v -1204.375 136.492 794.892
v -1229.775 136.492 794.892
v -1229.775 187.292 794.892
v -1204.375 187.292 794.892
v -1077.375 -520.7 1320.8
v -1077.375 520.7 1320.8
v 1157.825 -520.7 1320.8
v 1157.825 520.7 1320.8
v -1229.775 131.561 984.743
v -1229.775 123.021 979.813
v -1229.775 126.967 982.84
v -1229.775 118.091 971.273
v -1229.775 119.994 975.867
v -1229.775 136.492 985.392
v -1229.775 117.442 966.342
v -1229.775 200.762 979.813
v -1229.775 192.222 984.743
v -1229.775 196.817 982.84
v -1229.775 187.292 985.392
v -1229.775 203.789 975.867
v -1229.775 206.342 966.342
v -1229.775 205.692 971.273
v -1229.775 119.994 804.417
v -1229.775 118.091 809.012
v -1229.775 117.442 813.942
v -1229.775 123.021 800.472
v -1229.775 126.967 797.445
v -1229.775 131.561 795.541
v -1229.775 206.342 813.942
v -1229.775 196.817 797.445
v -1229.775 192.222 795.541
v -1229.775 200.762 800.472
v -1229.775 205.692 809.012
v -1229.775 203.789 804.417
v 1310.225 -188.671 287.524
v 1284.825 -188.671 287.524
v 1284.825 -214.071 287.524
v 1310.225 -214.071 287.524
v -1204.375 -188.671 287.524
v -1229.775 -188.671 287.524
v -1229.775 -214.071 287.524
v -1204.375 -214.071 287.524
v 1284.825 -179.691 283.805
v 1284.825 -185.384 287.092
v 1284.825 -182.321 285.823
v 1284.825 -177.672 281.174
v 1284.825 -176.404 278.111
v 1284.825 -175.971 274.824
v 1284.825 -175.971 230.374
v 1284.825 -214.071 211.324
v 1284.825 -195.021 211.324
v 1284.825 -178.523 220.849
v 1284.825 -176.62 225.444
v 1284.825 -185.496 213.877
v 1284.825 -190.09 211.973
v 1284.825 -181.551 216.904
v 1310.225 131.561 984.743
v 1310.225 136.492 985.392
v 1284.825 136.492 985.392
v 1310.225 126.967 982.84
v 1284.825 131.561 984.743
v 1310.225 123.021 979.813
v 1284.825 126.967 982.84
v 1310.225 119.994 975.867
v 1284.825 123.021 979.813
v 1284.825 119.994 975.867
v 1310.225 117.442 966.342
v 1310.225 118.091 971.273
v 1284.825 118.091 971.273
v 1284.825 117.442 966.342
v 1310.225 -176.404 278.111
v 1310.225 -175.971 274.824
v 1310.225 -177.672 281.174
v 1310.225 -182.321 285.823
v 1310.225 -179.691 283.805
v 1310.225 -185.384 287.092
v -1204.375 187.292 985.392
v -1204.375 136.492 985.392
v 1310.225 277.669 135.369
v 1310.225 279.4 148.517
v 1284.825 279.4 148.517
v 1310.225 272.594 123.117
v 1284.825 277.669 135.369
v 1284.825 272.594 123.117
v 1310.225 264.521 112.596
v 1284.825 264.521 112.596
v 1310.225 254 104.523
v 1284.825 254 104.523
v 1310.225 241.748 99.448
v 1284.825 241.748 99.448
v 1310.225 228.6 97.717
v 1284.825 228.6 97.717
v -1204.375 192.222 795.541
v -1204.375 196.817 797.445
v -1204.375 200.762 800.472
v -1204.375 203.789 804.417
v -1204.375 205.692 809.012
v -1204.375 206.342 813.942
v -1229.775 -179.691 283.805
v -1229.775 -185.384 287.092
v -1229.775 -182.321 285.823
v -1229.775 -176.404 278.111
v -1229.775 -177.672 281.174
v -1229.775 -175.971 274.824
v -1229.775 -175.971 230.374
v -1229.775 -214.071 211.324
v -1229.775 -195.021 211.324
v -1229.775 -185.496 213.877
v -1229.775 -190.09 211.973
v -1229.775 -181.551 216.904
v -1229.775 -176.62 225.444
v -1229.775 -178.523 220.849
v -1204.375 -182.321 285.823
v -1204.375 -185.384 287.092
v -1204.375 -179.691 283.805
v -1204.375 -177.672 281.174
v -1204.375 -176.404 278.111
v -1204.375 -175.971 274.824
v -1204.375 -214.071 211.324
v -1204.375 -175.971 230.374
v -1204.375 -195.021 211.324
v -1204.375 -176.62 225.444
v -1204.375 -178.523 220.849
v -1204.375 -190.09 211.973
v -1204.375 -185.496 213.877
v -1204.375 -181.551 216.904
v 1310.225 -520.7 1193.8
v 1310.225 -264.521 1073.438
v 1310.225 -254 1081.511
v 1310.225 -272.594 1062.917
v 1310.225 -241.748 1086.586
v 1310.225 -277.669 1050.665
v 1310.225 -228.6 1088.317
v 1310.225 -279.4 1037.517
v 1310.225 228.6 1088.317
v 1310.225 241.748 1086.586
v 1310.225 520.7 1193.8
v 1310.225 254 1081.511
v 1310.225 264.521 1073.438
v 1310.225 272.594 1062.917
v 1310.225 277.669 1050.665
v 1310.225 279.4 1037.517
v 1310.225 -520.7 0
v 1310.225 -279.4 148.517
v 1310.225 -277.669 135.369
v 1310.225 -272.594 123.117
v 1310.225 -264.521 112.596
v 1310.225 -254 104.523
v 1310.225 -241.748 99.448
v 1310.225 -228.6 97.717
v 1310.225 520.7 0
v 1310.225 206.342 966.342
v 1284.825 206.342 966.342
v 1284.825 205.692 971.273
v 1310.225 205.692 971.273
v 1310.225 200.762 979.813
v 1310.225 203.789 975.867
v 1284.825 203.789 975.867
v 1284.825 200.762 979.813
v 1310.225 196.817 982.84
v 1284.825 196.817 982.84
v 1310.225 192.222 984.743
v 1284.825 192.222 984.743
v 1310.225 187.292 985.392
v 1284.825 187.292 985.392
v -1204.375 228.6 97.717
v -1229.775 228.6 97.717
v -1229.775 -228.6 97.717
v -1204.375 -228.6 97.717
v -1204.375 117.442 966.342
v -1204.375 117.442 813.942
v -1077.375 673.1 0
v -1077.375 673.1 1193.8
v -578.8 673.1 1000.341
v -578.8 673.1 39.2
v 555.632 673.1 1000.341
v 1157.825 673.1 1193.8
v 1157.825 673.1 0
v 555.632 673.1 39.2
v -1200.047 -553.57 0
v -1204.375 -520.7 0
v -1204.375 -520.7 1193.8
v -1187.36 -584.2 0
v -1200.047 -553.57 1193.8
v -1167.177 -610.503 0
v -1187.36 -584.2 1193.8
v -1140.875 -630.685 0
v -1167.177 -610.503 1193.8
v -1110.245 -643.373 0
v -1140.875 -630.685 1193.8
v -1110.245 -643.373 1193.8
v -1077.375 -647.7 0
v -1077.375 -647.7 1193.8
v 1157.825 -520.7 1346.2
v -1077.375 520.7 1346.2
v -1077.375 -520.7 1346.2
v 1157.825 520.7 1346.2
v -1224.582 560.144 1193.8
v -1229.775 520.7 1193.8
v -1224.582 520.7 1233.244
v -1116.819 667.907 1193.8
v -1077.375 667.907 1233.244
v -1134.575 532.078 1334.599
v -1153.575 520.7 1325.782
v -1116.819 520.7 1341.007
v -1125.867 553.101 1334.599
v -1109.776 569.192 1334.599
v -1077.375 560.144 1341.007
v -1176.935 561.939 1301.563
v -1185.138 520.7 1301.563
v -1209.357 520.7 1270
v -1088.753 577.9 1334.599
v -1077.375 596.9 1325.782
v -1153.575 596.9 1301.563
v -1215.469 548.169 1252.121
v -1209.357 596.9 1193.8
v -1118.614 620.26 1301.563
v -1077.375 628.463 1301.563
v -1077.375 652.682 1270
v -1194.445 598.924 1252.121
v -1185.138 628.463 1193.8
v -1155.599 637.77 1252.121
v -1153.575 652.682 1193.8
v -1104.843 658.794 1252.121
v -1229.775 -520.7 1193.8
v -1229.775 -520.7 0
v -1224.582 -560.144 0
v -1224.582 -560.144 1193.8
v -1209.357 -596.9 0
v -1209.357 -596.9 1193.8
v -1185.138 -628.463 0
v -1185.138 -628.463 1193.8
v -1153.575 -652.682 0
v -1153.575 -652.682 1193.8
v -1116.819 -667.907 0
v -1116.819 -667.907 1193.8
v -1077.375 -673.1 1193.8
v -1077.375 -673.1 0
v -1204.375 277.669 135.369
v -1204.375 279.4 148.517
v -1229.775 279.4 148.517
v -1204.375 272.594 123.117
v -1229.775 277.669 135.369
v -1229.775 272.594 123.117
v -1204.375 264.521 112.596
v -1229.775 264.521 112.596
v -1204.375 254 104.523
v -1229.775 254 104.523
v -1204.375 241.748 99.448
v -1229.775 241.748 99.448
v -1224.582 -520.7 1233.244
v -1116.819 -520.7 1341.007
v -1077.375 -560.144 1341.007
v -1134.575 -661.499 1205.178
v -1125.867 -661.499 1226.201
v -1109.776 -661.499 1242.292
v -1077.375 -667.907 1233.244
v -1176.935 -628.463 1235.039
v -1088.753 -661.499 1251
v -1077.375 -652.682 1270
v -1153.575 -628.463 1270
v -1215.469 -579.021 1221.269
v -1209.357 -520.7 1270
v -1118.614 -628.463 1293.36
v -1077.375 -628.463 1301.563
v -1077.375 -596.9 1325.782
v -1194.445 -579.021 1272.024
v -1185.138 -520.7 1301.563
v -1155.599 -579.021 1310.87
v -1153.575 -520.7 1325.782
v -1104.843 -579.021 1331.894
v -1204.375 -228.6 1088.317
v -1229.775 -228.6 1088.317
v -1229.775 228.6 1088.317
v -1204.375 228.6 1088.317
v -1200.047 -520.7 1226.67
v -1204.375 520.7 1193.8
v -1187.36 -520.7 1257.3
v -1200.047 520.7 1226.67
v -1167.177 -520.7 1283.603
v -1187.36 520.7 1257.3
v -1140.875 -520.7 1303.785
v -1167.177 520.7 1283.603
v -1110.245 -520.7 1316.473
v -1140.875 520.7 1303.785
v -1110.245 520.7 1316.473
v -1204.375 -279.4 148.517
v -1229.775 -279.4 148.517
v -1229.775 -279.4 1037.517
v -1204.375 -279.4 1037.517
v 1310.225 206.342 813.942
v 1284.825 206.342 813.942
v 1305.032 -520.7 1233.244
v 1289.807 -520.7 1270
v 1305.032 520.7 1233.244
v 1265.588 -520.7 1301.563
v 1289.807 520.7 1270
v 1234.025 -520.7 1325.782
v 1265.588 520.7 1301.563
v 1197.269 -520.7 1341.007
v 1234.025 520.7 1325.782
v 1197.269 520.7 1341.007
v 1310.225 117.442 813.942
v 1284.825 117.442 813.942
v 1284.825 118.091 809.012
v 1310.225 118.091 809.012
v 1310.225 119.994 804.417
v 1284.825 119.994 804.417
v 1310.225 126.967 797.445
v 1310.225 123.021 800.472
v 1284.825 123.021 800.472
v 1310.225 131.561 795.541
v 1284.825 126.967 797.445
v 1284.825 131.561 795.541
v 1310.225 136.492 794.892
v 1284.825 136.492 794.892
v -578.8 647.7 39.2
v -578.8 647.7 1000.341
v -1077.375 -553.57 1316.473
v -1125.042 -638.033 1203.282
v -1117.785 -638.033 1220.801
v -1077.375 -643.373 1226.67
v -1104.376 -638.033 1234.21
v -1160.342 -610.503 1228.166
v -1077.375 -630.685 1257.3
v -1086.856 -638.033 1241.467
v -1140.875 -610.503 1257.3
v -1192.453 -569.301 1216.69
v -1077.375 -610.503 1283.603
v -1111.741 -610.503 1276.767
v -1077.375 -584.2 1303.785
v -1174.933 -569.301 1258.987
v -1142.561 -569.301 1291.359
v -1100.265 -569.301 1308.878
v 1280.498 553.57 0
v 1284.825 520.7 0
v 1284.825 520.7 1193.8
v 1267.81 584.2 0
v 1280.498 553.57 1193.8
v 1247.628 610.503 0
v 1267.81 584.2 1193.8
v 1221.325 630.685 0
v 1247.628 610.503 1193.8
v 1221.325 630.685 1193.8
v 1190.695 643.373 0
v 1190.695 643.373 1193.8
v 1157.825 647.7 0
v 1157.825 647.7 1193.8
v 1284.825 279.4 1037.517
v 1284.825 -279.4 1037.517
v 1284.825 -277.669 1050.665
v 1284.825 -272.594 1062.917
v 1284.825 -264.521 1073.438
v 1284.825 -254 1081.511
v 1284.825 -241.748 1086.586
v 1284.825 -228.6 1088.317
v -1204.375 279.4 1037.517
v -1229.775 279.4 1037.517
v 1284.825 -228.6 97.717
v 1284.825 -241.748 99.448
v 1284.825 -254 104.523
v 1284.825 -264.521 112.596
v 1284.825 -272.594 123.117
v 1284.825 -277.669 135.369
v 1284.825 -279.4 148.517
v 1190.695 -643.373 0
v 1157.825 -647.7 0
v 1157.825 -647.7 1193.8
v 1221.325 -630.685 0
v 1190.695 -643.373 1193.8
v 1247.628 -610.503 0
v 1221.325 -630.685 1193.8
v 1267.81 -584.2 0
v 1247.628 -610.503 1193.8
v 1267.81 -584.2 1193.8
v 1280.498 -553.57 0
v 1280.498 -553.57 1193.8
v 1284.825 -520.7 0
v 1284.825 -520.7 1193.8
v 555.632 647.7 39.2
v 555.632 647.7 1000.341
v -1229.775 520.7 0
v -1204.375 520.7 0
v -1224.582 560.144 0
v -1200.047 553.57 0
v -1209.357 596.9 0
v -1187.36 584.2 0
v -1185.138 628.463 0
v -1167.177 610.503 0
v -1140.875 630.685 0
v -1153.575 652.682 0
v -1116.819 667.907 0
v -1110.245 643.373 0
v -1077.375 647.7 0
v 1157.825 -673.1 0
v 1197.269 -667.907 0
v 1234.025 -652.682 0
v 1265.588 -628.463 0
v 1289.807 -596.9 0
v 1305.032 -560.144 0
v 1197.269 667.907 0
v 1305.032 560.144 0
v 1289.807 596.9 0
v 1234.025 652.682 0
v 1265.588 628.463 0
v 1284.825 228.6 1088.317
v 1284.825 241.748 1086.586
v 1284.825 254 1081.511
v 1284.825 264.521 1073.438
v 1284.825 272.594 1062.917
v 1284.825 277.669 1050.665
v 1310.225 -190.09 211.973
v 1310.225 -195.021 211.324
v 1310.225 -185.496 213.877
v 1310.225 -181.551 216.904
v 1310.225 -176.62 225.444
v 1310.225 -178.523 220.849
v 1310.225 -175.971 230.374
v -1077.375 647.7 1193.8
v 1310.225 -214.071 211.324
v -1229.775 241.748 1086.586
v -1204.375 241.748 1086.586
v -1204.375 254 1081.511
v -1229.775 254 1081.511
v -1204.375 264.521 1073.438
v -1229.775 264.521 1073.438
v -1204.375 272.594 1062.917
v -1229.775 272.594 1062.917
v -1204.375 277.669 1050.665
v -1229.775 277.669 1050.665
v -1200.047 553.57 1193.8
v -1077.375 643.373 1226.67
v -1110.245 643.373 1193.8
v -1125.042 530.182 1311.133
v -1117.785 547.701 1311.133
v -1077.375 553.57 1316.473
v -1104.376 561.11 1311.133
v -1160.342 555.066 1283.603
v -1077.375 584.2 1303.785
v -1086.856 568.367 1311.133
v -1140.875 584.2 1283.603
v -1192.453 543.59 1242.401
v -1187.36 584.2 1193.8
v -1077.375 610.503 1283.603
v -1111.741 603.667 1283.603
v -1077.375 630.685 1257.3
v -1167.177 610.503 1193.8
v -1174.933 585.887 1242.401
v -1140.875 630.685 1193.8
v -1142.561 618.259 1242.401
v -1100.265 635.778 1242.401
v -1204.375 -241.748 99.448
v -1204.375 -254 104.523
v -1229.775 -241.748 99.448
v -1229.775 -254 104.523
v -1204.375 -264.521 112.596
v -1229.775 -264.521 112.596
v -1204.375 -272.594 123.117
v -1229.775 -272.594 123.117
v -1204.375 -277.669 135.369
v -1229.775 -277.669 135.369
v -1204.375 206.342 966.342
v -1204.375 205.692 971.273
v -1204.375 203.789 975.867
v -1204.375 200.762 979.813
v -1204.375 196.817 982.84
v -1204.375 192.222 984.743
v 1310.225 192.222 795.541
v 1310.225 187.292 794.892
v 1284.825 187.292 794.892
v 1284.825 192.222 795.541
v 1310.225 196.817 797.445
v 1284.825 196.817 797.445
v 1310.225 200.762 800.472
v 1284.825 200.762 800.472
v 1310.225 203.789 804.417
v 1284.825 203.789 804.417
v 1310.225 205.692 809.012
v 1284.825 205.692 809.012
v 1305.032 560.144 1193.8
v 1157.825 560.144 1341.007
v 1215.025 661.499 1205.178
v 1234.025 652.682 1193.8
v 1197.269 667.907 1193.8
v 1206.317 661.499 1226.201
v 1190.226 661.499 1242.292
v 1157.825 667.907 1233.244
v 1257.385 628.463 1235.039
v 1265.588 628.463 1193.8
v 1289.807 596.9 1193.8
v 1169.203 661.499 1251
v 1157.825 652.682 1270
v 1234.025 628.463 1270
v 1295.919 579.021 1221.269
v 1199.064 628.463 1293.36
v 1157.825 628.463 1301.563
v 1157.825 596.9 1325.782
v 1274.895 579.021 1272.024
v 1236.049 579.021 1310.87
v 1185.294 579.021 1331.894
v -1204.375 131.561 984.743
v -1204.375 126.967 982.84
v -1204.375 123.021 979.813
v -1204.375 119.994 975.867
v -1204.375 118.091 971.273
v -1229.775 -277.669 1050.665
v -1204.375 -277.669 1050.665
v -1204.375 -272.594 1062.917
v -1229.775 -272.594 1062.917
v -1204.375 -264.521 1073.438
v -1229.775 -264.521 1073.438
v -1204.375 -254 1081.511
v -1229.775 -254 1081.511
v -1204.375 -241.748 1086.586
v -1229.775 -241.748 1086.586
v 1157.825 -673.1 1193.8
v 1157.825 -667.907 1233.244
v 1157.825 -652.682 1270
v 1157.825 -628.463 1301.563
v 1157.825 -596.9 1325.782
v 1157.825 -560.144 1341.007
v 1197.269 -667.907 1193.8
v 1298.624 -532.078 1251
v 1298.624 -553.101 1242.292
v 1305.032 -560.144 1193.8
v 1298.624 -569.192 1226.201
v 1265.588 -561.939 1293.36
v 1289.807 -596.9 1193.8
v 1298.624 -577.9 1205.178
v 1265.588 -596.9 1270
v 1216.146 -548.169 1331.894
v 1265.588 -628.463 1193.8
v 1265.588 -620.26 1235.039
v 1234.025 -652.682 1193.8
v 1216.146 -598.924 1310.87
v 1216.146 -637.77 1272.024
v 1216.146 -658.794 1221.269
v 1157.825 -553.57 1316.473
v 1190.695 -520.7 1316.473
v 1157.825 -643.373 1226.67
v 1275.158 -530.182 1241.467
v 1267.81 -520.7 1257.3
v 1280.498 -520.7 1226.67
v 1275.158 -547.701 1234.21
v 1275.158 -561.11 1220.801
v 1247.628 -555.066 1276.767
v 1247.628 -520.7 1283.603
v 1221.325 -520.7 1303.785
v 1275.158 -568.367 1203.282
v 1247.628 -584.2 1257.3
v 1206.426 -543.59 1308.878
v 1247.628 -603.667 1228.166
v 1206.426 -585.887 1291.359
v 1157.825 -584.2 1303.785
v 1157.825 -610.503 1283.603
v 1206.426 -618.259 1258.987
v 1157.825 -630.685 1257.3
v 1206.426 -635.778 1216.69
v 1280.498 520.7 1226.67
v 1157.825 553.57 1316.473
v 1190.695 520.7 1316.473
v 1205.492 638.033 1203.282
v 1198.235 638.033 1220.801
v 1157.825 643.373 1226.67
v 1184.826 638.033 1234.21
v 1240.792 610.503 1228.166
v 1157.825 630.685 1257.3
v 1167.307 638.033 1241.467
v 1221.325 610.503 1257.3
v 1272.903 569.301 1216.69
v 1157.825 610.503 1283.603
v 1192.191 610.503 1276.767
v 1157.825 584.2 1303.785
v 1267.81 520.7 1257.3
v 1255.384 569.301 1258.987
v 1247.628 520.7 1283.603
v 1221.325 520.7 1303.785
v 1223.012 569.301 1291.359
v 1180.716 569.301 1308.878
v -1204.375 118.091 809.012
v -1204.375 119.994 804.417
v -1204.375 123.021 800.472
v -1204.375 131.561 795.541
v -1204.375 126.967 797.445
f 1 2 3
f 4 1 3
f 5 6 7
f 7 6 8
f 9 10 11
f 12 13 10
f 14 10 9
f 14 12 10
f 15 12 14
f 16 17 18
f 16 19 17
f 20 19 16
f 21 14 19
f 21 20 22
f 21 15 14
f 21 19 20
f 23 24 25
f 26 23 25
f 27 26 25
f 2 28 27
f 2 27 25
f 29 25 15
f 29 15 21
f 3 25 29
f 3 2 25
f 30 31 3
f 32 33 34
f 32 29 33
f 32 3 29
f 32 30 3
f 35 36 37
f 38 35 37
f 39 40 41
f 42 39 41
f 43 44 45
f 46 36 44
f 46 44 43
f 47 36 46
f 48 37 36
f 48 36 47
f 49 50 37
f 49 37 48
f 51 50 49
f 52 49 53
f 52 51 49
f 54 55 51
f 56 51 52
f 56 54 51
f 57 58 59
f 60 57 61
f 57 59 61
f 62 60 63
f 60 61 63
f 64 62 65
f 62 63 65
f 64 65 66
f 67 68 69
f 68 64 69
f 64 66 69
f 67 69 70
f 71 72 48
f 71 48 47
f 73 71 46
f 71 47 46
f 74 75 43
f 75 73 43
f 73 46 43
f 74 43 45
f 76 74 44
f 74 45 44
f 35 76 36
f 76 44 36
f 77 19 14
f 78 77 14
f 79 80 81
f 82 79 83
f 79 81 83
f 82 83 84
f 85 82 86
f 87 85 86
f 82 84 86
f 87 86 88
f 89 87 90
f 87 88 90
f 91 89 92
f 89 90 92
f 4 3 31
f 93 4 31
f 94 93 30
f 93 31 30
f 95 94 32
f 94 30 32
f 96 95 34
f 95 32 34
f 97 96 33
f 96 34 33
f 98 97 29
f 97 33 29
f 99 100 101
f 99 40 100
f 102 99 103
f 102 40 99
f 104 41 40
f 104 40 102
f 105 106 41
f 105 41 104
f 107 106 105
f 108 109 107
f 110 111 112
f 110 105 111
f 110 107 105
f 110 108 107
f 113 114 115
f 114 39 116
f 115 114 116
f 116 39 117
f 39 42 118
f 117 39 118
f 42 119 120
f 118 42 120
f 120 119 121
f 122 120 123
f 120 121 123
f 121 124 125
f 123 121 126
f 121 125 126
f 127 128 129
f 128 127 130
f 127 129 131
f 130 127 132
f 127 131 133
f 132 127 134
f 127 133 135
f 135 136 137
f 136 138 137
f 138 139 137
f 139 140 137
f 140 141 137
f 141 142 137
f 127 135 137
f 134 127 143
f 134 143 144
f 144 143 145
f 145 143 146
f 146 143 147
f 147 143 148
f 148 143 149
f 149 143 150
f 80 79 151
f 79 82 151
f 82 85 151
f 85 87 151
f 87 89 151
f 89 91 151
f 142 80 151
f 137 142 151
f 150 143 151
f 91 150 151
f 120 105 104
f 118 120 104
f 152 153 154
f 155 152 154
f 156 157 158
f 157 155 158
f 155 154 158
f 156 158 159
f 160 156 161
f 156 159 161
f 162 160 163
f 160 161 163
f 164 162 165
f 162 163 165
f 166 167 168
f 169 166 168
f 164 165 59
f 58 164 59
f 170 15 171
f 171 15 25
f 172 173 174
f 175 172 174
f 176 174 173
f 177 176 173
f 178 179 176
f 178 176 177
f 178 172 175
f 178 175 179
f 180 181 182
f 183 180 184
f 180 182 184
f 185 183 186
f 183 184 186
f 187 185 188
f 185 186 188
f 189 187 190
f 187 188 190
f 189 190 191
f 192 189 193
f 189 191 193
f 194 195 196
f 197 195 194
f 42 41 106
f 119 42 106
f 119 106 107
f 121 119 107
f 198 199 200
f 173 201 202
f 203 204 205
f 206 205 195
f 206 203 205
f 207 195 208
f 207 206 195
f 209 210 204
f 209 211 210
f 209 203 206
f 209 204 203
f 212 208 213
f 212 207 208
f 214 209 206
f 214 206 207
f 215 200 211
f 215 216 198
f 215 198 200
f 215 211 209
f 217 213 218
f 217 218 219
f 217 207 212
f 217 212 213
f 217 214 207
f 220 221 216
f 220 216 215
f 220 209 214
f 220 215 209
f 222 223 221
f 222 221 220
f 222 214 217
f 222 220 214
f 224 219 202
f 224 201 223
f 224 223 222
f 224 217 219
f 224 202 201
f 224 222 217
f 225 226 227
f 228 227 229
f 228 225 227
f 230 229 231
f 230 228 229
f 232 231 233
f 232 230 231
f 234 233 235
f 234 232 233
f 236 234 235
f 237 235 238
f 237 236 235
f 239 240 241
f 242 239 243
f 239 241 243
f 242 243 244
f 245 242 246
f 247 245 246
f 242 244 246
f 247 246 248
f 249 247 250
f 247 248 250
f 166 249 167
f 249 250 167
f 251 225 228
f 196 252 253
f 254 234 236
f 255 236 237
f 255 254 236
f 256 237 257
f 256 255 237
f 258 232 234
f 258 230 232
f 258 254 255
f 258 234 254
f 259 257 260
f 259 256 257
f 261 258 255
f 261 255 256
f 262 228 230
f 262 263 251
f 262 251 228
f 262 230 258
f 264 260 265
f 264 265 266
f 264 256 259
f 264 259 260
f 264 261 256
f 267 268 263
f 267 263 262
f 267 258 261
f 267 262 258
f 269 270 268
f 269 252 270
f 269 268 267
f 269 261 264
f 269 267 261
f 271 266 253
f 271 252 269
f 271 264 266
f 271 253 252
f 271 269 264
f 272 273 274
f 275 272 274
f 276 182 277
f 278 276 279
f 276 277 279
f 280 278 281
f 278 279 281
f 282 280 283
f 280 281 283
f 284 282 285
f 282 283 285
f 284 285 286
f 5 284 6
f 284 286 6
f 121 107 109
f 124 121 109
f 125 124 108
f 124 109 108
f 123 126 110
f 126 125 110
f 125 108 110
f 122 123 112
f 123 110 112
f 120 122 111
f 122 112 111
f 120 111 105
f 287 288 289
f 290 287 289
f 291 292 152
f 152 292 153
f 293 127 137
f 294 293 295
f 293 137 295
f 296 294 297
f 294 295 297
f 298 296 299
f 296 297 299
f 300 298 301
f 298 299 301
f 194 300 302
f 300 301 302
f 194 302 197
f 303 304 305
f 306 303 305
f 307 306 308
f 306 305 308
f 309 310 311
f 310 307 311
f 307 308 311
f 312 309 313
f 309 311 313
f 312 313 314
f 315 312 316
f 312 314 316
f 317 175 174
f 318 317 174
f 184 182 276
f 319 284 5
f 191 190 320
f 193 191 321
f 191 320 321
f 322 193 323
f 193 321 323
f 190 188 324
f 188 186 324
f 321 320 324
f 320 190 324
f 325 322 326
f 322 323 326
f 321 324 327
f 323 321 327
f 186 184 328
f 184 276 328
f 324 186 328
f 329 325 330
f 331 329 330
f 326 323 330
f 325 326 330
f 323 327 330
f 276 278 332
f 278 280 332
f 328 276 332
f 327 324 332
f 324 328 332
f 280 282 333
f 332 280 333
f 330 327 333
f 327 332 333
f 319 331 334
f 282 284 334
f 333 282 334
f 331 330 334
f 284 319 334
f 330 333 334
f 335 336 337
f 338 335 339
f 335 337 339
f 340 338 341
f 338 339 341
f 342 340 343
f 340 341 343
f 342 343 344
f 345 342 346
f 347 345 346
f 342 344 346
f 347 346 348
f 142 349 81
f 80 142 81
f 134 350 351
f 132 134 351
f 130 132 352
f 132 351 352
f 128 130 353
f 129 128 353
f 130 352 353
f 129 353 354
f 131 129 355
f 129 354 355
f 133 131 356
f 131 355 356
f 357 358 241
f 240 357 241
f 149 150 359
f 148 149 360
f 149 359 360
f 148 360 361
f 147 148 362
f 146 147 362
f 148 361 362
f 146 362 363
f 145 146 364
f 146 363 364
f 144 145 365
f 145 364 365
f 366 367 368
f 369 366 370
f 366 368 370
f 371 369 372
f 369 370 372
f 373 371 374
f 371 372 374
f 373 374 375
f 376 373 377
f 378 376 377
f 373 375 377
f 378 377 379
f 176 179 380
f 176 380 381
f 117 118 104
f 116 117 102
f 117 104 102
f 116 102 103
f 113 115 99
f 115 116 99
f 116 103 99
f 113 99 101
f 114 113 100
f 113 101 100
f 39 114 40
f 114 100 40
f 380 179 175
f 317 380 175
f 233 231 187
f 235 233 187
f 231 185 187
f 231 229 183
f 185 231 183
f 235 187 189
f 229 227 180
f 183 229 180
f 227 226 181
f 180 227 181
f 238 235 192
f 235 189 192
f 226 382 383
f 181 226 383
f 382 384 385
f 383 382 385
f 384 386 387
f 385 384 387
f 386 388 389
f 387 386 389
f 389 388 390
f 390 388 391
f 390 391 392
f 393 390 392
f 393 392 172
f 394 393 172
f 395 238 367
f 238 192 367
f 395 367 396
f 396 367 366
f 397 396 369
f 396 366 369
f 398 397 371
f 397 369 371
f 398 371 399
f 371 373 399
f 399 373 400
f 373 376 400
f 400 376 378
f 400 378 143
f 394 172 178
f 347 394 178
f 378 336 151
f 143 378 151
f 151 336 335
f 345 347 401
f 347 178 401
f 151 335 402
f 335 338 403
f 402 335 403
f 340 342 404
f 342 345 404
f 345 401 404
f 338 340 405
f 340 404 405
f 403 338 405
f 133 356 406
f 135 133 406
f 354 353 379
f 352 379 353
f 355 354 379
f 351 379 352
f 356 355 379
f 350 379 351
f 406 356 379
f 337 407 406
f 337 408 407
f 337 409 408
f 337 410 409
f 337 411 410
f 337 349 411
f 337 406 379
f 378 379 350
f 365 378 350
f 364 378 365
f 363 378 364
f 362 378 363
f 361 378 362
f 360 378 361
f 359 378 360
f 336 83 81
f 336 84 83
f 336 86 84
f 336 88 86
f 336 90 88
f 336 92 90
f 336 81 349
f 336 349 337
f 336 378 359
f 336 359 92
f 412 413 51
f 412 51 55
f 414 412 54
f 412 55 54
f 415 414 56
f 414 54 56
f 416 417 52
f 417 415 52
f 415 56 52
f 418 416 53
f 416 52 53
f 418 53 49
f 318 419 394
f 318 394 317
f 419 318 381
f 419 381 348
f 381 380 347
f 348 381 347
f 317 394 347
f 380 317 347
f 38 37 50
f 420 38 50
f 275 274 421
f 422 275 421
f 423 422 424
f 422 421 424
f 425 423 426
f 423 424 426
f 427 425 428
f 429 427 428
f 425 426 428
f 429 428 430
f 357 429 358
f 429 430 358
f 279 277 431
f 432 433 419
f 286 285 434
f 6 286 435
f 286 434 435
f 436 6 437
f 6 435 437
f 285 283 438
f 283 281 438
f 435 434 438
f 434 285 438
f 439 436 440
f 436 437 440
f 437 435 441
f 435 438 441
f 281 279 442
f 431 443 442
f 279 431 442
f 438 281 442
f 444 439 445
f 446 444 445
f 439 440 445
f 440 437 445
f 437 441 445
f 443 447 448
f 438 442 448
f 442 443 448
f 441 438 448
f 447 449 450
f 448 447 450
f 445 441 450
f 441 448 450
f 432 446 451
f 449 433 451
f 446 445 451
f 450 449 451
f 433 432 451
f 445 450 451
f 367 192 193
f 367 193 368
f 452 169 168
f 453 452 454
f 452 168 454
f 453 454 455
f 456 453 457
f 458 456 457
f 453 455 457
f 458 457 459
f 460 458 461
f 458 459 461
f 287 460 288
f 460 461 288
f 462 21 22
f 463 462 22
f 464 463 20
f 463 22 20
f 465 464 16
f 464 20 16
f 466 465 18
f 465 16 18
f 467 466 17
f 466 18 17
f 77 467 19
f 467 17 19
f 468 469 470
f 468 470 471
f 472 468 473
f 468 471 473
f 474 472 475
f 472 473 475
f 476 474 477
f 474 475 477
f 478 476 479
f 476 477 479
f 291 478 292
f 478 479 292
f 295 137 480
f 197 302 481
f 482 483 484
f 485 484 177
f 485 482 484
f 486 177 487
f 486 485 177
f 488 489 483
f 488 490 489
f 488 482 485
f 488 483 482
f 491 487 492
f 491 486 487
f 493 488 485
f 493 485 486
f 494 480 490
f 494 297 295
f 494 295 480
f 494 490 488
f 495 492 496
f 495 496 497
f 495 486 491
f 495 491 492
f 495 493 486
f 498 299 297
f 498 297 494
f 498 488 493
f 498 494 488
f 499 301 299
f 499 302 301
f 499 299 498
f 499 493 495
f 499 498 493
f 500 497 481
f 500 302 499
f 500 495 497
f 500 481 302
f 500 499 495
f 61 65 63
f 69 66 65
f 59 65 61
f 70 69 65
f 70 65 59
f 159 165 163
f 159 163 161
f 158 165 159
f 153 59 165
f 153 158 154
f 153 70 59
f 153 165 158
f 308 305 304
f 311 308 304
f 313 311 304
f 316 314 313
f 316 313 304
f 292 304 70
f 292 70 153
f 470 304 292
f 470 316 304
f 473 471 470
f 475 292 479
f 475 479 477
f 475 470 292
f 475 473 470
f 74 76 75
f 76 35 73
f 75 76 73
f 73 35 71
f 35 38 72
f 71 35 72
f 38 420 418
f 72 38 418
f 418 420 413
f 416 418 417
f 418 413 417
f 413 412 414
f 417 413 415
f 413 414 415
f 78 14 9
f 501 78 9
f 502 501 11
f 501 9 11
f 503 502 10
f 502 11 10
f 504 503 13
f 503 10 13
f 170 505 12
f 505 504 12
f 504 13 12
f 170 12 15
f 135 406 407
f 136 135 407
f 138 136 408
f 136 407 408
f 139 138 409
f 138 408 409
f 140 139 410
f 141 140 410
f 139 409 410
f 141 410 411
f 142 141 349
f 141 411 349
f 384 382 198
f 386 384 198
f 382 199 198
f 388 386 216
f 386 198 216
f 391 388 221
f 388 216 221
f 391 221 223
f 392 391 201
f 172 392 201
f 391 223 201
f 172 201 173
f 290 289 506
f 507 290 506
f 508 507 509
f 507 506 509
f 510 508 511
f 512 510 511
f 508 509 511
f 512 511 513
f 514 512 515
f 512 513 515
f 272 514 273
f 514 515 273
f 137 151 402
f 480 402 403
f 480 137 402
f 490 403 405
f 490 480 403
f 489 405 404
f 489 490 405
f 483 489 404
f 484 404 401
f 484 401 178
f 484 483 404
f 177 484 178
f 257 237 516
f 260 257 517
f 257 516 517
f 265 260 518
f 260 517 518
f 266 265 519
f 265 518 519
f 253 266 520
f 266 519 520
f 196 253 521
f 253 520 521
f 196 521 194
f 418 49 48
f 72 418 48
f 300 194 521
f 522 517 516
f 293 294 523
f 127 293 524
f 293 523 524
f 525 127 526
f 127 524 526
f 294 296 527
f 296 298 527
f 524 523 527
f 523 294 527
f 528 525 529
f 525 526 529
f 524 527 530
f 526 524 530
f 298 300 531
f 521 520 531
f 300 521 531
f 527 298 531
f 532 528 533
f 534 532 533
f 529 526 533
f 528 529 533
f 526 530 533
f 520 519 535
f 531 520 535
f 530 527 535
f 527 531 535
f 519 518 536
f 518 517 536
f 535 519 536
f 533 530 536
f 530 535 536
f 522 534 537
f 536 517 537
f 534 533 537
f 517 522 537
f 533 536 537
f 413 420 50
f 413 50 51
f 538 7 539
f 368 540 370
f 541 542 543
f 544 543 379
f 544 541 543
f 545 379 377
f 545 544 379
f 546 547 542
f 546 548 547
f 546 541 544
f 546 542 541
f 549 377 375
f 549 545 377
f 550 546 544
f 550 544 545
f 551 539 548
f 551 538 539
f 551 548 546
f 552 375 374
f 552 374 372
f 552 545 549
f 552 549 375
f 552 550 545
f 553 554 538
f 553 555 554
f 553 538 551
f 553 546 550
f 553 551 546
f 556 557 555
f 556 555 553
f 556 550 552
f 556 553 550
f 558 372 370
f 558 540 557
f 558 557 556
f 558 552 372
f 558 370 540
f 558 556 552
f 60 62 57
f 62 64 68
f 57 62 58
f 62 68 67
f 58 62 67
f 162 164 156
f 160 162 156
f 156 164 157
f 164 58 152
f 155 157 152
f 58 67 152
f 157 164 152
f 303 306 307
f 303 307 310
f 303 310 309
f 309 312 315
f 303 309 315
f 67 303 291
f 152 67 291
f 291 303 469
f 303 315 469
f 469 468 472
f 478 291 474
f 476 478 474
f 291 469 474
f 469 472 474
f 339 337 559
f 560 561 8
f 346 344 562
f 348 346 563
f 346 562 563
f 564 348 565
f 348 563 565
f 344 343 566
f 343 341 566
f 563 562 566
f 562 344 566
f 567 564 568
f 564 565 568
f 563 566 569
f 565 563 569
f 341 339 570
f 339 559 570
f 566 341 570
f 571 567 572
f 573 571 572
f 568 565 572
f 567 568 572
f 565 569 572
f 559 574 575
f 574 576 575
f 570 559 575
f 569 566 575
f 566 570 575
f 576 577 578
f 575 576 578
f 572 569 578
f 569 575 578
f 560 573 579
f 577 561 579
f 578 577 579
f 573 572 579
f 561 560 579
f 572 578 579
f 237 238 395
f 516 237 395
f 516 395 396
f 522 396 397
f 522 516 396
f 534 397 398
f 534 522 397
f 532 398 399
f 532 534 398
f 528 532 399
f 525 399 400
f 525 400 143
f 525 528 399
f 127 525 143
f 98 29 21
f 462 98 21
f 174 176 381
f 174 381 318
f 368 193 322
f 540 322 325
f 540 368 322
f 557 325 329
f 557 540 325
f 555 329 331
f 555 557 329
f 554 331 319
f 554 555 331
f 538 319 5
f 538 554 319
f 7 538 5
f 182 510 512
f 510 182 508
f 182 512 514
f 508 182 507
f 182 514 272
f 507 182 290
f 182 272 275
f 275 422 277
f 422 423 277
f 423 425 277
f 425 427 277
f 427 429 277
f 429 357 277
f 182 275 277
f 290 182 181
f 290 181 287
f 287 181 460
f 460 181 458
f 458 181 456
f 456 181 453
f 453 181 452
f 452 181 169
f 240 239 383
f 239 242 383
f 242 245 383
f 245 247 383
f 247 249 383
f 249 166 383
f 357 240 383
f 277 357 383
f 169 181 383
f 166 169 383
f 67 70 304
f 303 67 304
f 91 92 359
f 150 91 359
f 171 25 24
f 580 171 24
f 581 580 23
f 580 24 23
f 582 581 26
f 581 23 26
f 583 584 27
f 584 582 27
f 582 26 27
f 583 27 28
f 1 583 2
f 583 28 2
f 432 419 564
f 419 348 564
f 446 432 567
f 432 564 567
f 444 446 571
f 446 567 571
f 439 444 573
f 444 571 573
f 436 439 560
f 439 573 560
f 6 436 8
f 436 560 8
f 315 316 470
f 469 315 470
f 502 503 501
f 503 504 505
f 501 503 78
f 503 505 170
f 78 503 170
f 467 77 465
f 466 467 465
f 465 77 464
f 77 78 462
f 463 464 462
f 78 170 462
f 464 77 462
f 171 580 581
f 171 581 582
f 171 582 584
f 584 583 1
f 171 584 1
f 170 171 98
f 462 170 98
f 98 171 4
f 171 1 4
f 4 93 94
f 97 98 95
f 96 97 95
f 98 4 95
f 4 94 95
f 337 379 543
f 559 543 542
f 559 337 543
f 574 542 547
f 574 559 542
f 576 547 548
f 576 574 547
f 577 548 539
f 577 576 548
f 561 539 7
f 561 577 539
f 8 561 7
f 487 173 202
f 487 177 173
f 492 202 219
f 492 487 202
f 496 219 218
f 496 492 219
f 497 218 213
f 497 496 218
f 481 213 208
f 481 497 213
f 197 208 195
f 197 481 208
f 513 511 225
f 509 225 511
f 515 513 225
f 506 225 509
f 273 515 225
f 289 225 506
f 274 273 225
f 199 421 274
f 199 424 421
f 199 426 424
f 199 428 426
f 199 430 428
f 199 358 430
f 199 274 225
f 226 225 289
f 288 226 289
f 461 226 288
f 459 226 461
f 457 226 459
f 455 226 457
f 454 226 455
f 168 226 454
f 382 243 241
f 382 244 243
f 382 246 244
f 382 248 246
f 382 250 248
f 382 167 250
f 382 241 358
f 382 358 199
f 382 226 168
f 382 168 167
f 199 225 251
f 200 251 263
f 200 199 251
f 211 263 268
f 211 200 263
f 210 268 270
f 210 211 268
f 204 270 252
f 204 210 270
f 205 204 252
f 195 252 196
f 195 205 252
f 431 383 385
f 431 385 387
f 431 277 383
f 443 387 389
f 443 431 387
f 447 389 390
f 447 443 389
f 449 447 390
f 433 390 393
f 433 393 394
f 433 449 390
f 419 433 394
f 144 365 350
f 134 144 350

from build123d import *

# Parameters (mm, degrees)
F0_W     = 2540
F0_H     = 1346.2
F1_DEPTH = 1346.2
F2_R     = 152.4
F3_T     = -25.4
F5_DEPTH = 3449.32
F6_W     = 1134.432077
F6_H     = 961.140863
F7_DEPTH = 25.4


with BuildPart() as f1:
    # F0 (on Top) → F1 (new body)
    with BuildSketch(Plane.XY):
        with Locations((40.225086, 0)):
            Rectangle(F0_W, F0_H)
    extrude(amount=F1_DEPTH)

    # F2
    f2_edges = [f1.edges().sort_by_distance(p)[0] for p in [
        (-1229.774914, 673.1, 673.1),
        (-1229.774914, 0, 1346.2),
        (-1229.774914, -673.1, 673.1),
        (40.225086, -673.1, 1346.2),
        (1310.225086, 0, 1346.2),
        (1310.225086, -673.1, 673.1),
        (1310.225086, 673.1, 673.1),
        (40.225086, 673.1, 1346.2),
    ]]
    fillet(f2_edges, radius=F2_R)

    # F3
    f3_openings = [f1.faces().sort_by_distance(p)[0] for p in [
        (40.225086, 0, 0),
    ]]
    offset(amount=F3_T, openings=f3_openings)

    # F4 (on face) → F5 (cut)
    with BuildSketch(Plane(origin=(-1229.774914, 0, 0), x_dir=(0, -1, 0), z_dir=(-1, 0, 0))):
        with BuildLine():
            ThreePointArc((279.4, 1037.517101), (264.521024, 1073.438126), (228.6, 1088.317101))
            Line((228.6, 1088.317101), (-228.6, 1088.317101))
            ThreePointArc((-228.6, 1088.317101), (-264.521024, 1073.438126), (-279.4, 1037.517101))
            Line((-279.4, 1037.517101), (-279.4, 148.517101))
            ThreePointArc((-279.4, 148.517101), (-264.521024, 112.596077), (-228.6, 97.717101))
            Line((-228.6, 97.717101), (228.6, 97.717101))
            ThreePointArc((228.6, 97.717101), (264.521024, 112.596077), (279.4, 148.517101))
            Line((279.4, 148.517101), (279.4, 1037.517101))
        make_face()
        with BuildLine():
            Line((214.070957, 211.324298), (195.020957, 211.324298))
            ThreePointArc((195.020957, 211.324298), (181.550573, 216.903914), (175.970957, 230.374298))
            Line((175.970957, 230.374298), (175.970957, 274.824298))
            ThreePointArc((175.970957, 274.824298), (179.690701, 283.804554), (188.670957, 287.524298))
            Line((188.670957, 287.524298), (214.070957, 287.524298))
            Line((214.070957, 287.524298), (214.070957, 211.324298))
        make_face(mode=Mode.SUBTRACT)
        with BuildLine():
            ThreePointArc((-206.34158, 966.342371), (-200.761964, 979.812755), (-187.29158, 985.392371))
            Line((-187.29158, 985.392371), (-136.49158, 985.392371))
            ThreePointArc((-136.49158, 985.392371), (-123.021195, 979.812755), (-117.44158, 966.342371))
            Line((-117.44158, 966.342371), (-117.44158, 813.942371))
            ThreePointArc((-117.44158, 813.942371), (-123.021195, 800.471987), (-136.49158, 794.892371))
            Line((-136.49158, 794.892371), (-187.29158, 794.892371))
            ThreePointArc((-187.29158, 794.892371), (-200.761964, 800.471987), (-206.34158, 813.942371))
            Line((-206.34158, 813.942371), (-206.34158, 966.342371))
        make_face(mode=Mode.SUBTRACT)
    extrude(amount=-F5_DEPTH, mode=Mode.SUBTRACT)

    # F6 (on face) → F7 (cut)
    with BuildSketch(Plane(origin=(0, 673.1, 0), x_dir=(-1, 0, 0), z_dir=(0, 1, 0))):
        with Locations((11.583627, 519.770268)):
            Rectangle(F6_W, F6_H)
    extrude(amount=-F7_DEPTH, mode=Mode.SUBTRACT)


solid = f1.part
